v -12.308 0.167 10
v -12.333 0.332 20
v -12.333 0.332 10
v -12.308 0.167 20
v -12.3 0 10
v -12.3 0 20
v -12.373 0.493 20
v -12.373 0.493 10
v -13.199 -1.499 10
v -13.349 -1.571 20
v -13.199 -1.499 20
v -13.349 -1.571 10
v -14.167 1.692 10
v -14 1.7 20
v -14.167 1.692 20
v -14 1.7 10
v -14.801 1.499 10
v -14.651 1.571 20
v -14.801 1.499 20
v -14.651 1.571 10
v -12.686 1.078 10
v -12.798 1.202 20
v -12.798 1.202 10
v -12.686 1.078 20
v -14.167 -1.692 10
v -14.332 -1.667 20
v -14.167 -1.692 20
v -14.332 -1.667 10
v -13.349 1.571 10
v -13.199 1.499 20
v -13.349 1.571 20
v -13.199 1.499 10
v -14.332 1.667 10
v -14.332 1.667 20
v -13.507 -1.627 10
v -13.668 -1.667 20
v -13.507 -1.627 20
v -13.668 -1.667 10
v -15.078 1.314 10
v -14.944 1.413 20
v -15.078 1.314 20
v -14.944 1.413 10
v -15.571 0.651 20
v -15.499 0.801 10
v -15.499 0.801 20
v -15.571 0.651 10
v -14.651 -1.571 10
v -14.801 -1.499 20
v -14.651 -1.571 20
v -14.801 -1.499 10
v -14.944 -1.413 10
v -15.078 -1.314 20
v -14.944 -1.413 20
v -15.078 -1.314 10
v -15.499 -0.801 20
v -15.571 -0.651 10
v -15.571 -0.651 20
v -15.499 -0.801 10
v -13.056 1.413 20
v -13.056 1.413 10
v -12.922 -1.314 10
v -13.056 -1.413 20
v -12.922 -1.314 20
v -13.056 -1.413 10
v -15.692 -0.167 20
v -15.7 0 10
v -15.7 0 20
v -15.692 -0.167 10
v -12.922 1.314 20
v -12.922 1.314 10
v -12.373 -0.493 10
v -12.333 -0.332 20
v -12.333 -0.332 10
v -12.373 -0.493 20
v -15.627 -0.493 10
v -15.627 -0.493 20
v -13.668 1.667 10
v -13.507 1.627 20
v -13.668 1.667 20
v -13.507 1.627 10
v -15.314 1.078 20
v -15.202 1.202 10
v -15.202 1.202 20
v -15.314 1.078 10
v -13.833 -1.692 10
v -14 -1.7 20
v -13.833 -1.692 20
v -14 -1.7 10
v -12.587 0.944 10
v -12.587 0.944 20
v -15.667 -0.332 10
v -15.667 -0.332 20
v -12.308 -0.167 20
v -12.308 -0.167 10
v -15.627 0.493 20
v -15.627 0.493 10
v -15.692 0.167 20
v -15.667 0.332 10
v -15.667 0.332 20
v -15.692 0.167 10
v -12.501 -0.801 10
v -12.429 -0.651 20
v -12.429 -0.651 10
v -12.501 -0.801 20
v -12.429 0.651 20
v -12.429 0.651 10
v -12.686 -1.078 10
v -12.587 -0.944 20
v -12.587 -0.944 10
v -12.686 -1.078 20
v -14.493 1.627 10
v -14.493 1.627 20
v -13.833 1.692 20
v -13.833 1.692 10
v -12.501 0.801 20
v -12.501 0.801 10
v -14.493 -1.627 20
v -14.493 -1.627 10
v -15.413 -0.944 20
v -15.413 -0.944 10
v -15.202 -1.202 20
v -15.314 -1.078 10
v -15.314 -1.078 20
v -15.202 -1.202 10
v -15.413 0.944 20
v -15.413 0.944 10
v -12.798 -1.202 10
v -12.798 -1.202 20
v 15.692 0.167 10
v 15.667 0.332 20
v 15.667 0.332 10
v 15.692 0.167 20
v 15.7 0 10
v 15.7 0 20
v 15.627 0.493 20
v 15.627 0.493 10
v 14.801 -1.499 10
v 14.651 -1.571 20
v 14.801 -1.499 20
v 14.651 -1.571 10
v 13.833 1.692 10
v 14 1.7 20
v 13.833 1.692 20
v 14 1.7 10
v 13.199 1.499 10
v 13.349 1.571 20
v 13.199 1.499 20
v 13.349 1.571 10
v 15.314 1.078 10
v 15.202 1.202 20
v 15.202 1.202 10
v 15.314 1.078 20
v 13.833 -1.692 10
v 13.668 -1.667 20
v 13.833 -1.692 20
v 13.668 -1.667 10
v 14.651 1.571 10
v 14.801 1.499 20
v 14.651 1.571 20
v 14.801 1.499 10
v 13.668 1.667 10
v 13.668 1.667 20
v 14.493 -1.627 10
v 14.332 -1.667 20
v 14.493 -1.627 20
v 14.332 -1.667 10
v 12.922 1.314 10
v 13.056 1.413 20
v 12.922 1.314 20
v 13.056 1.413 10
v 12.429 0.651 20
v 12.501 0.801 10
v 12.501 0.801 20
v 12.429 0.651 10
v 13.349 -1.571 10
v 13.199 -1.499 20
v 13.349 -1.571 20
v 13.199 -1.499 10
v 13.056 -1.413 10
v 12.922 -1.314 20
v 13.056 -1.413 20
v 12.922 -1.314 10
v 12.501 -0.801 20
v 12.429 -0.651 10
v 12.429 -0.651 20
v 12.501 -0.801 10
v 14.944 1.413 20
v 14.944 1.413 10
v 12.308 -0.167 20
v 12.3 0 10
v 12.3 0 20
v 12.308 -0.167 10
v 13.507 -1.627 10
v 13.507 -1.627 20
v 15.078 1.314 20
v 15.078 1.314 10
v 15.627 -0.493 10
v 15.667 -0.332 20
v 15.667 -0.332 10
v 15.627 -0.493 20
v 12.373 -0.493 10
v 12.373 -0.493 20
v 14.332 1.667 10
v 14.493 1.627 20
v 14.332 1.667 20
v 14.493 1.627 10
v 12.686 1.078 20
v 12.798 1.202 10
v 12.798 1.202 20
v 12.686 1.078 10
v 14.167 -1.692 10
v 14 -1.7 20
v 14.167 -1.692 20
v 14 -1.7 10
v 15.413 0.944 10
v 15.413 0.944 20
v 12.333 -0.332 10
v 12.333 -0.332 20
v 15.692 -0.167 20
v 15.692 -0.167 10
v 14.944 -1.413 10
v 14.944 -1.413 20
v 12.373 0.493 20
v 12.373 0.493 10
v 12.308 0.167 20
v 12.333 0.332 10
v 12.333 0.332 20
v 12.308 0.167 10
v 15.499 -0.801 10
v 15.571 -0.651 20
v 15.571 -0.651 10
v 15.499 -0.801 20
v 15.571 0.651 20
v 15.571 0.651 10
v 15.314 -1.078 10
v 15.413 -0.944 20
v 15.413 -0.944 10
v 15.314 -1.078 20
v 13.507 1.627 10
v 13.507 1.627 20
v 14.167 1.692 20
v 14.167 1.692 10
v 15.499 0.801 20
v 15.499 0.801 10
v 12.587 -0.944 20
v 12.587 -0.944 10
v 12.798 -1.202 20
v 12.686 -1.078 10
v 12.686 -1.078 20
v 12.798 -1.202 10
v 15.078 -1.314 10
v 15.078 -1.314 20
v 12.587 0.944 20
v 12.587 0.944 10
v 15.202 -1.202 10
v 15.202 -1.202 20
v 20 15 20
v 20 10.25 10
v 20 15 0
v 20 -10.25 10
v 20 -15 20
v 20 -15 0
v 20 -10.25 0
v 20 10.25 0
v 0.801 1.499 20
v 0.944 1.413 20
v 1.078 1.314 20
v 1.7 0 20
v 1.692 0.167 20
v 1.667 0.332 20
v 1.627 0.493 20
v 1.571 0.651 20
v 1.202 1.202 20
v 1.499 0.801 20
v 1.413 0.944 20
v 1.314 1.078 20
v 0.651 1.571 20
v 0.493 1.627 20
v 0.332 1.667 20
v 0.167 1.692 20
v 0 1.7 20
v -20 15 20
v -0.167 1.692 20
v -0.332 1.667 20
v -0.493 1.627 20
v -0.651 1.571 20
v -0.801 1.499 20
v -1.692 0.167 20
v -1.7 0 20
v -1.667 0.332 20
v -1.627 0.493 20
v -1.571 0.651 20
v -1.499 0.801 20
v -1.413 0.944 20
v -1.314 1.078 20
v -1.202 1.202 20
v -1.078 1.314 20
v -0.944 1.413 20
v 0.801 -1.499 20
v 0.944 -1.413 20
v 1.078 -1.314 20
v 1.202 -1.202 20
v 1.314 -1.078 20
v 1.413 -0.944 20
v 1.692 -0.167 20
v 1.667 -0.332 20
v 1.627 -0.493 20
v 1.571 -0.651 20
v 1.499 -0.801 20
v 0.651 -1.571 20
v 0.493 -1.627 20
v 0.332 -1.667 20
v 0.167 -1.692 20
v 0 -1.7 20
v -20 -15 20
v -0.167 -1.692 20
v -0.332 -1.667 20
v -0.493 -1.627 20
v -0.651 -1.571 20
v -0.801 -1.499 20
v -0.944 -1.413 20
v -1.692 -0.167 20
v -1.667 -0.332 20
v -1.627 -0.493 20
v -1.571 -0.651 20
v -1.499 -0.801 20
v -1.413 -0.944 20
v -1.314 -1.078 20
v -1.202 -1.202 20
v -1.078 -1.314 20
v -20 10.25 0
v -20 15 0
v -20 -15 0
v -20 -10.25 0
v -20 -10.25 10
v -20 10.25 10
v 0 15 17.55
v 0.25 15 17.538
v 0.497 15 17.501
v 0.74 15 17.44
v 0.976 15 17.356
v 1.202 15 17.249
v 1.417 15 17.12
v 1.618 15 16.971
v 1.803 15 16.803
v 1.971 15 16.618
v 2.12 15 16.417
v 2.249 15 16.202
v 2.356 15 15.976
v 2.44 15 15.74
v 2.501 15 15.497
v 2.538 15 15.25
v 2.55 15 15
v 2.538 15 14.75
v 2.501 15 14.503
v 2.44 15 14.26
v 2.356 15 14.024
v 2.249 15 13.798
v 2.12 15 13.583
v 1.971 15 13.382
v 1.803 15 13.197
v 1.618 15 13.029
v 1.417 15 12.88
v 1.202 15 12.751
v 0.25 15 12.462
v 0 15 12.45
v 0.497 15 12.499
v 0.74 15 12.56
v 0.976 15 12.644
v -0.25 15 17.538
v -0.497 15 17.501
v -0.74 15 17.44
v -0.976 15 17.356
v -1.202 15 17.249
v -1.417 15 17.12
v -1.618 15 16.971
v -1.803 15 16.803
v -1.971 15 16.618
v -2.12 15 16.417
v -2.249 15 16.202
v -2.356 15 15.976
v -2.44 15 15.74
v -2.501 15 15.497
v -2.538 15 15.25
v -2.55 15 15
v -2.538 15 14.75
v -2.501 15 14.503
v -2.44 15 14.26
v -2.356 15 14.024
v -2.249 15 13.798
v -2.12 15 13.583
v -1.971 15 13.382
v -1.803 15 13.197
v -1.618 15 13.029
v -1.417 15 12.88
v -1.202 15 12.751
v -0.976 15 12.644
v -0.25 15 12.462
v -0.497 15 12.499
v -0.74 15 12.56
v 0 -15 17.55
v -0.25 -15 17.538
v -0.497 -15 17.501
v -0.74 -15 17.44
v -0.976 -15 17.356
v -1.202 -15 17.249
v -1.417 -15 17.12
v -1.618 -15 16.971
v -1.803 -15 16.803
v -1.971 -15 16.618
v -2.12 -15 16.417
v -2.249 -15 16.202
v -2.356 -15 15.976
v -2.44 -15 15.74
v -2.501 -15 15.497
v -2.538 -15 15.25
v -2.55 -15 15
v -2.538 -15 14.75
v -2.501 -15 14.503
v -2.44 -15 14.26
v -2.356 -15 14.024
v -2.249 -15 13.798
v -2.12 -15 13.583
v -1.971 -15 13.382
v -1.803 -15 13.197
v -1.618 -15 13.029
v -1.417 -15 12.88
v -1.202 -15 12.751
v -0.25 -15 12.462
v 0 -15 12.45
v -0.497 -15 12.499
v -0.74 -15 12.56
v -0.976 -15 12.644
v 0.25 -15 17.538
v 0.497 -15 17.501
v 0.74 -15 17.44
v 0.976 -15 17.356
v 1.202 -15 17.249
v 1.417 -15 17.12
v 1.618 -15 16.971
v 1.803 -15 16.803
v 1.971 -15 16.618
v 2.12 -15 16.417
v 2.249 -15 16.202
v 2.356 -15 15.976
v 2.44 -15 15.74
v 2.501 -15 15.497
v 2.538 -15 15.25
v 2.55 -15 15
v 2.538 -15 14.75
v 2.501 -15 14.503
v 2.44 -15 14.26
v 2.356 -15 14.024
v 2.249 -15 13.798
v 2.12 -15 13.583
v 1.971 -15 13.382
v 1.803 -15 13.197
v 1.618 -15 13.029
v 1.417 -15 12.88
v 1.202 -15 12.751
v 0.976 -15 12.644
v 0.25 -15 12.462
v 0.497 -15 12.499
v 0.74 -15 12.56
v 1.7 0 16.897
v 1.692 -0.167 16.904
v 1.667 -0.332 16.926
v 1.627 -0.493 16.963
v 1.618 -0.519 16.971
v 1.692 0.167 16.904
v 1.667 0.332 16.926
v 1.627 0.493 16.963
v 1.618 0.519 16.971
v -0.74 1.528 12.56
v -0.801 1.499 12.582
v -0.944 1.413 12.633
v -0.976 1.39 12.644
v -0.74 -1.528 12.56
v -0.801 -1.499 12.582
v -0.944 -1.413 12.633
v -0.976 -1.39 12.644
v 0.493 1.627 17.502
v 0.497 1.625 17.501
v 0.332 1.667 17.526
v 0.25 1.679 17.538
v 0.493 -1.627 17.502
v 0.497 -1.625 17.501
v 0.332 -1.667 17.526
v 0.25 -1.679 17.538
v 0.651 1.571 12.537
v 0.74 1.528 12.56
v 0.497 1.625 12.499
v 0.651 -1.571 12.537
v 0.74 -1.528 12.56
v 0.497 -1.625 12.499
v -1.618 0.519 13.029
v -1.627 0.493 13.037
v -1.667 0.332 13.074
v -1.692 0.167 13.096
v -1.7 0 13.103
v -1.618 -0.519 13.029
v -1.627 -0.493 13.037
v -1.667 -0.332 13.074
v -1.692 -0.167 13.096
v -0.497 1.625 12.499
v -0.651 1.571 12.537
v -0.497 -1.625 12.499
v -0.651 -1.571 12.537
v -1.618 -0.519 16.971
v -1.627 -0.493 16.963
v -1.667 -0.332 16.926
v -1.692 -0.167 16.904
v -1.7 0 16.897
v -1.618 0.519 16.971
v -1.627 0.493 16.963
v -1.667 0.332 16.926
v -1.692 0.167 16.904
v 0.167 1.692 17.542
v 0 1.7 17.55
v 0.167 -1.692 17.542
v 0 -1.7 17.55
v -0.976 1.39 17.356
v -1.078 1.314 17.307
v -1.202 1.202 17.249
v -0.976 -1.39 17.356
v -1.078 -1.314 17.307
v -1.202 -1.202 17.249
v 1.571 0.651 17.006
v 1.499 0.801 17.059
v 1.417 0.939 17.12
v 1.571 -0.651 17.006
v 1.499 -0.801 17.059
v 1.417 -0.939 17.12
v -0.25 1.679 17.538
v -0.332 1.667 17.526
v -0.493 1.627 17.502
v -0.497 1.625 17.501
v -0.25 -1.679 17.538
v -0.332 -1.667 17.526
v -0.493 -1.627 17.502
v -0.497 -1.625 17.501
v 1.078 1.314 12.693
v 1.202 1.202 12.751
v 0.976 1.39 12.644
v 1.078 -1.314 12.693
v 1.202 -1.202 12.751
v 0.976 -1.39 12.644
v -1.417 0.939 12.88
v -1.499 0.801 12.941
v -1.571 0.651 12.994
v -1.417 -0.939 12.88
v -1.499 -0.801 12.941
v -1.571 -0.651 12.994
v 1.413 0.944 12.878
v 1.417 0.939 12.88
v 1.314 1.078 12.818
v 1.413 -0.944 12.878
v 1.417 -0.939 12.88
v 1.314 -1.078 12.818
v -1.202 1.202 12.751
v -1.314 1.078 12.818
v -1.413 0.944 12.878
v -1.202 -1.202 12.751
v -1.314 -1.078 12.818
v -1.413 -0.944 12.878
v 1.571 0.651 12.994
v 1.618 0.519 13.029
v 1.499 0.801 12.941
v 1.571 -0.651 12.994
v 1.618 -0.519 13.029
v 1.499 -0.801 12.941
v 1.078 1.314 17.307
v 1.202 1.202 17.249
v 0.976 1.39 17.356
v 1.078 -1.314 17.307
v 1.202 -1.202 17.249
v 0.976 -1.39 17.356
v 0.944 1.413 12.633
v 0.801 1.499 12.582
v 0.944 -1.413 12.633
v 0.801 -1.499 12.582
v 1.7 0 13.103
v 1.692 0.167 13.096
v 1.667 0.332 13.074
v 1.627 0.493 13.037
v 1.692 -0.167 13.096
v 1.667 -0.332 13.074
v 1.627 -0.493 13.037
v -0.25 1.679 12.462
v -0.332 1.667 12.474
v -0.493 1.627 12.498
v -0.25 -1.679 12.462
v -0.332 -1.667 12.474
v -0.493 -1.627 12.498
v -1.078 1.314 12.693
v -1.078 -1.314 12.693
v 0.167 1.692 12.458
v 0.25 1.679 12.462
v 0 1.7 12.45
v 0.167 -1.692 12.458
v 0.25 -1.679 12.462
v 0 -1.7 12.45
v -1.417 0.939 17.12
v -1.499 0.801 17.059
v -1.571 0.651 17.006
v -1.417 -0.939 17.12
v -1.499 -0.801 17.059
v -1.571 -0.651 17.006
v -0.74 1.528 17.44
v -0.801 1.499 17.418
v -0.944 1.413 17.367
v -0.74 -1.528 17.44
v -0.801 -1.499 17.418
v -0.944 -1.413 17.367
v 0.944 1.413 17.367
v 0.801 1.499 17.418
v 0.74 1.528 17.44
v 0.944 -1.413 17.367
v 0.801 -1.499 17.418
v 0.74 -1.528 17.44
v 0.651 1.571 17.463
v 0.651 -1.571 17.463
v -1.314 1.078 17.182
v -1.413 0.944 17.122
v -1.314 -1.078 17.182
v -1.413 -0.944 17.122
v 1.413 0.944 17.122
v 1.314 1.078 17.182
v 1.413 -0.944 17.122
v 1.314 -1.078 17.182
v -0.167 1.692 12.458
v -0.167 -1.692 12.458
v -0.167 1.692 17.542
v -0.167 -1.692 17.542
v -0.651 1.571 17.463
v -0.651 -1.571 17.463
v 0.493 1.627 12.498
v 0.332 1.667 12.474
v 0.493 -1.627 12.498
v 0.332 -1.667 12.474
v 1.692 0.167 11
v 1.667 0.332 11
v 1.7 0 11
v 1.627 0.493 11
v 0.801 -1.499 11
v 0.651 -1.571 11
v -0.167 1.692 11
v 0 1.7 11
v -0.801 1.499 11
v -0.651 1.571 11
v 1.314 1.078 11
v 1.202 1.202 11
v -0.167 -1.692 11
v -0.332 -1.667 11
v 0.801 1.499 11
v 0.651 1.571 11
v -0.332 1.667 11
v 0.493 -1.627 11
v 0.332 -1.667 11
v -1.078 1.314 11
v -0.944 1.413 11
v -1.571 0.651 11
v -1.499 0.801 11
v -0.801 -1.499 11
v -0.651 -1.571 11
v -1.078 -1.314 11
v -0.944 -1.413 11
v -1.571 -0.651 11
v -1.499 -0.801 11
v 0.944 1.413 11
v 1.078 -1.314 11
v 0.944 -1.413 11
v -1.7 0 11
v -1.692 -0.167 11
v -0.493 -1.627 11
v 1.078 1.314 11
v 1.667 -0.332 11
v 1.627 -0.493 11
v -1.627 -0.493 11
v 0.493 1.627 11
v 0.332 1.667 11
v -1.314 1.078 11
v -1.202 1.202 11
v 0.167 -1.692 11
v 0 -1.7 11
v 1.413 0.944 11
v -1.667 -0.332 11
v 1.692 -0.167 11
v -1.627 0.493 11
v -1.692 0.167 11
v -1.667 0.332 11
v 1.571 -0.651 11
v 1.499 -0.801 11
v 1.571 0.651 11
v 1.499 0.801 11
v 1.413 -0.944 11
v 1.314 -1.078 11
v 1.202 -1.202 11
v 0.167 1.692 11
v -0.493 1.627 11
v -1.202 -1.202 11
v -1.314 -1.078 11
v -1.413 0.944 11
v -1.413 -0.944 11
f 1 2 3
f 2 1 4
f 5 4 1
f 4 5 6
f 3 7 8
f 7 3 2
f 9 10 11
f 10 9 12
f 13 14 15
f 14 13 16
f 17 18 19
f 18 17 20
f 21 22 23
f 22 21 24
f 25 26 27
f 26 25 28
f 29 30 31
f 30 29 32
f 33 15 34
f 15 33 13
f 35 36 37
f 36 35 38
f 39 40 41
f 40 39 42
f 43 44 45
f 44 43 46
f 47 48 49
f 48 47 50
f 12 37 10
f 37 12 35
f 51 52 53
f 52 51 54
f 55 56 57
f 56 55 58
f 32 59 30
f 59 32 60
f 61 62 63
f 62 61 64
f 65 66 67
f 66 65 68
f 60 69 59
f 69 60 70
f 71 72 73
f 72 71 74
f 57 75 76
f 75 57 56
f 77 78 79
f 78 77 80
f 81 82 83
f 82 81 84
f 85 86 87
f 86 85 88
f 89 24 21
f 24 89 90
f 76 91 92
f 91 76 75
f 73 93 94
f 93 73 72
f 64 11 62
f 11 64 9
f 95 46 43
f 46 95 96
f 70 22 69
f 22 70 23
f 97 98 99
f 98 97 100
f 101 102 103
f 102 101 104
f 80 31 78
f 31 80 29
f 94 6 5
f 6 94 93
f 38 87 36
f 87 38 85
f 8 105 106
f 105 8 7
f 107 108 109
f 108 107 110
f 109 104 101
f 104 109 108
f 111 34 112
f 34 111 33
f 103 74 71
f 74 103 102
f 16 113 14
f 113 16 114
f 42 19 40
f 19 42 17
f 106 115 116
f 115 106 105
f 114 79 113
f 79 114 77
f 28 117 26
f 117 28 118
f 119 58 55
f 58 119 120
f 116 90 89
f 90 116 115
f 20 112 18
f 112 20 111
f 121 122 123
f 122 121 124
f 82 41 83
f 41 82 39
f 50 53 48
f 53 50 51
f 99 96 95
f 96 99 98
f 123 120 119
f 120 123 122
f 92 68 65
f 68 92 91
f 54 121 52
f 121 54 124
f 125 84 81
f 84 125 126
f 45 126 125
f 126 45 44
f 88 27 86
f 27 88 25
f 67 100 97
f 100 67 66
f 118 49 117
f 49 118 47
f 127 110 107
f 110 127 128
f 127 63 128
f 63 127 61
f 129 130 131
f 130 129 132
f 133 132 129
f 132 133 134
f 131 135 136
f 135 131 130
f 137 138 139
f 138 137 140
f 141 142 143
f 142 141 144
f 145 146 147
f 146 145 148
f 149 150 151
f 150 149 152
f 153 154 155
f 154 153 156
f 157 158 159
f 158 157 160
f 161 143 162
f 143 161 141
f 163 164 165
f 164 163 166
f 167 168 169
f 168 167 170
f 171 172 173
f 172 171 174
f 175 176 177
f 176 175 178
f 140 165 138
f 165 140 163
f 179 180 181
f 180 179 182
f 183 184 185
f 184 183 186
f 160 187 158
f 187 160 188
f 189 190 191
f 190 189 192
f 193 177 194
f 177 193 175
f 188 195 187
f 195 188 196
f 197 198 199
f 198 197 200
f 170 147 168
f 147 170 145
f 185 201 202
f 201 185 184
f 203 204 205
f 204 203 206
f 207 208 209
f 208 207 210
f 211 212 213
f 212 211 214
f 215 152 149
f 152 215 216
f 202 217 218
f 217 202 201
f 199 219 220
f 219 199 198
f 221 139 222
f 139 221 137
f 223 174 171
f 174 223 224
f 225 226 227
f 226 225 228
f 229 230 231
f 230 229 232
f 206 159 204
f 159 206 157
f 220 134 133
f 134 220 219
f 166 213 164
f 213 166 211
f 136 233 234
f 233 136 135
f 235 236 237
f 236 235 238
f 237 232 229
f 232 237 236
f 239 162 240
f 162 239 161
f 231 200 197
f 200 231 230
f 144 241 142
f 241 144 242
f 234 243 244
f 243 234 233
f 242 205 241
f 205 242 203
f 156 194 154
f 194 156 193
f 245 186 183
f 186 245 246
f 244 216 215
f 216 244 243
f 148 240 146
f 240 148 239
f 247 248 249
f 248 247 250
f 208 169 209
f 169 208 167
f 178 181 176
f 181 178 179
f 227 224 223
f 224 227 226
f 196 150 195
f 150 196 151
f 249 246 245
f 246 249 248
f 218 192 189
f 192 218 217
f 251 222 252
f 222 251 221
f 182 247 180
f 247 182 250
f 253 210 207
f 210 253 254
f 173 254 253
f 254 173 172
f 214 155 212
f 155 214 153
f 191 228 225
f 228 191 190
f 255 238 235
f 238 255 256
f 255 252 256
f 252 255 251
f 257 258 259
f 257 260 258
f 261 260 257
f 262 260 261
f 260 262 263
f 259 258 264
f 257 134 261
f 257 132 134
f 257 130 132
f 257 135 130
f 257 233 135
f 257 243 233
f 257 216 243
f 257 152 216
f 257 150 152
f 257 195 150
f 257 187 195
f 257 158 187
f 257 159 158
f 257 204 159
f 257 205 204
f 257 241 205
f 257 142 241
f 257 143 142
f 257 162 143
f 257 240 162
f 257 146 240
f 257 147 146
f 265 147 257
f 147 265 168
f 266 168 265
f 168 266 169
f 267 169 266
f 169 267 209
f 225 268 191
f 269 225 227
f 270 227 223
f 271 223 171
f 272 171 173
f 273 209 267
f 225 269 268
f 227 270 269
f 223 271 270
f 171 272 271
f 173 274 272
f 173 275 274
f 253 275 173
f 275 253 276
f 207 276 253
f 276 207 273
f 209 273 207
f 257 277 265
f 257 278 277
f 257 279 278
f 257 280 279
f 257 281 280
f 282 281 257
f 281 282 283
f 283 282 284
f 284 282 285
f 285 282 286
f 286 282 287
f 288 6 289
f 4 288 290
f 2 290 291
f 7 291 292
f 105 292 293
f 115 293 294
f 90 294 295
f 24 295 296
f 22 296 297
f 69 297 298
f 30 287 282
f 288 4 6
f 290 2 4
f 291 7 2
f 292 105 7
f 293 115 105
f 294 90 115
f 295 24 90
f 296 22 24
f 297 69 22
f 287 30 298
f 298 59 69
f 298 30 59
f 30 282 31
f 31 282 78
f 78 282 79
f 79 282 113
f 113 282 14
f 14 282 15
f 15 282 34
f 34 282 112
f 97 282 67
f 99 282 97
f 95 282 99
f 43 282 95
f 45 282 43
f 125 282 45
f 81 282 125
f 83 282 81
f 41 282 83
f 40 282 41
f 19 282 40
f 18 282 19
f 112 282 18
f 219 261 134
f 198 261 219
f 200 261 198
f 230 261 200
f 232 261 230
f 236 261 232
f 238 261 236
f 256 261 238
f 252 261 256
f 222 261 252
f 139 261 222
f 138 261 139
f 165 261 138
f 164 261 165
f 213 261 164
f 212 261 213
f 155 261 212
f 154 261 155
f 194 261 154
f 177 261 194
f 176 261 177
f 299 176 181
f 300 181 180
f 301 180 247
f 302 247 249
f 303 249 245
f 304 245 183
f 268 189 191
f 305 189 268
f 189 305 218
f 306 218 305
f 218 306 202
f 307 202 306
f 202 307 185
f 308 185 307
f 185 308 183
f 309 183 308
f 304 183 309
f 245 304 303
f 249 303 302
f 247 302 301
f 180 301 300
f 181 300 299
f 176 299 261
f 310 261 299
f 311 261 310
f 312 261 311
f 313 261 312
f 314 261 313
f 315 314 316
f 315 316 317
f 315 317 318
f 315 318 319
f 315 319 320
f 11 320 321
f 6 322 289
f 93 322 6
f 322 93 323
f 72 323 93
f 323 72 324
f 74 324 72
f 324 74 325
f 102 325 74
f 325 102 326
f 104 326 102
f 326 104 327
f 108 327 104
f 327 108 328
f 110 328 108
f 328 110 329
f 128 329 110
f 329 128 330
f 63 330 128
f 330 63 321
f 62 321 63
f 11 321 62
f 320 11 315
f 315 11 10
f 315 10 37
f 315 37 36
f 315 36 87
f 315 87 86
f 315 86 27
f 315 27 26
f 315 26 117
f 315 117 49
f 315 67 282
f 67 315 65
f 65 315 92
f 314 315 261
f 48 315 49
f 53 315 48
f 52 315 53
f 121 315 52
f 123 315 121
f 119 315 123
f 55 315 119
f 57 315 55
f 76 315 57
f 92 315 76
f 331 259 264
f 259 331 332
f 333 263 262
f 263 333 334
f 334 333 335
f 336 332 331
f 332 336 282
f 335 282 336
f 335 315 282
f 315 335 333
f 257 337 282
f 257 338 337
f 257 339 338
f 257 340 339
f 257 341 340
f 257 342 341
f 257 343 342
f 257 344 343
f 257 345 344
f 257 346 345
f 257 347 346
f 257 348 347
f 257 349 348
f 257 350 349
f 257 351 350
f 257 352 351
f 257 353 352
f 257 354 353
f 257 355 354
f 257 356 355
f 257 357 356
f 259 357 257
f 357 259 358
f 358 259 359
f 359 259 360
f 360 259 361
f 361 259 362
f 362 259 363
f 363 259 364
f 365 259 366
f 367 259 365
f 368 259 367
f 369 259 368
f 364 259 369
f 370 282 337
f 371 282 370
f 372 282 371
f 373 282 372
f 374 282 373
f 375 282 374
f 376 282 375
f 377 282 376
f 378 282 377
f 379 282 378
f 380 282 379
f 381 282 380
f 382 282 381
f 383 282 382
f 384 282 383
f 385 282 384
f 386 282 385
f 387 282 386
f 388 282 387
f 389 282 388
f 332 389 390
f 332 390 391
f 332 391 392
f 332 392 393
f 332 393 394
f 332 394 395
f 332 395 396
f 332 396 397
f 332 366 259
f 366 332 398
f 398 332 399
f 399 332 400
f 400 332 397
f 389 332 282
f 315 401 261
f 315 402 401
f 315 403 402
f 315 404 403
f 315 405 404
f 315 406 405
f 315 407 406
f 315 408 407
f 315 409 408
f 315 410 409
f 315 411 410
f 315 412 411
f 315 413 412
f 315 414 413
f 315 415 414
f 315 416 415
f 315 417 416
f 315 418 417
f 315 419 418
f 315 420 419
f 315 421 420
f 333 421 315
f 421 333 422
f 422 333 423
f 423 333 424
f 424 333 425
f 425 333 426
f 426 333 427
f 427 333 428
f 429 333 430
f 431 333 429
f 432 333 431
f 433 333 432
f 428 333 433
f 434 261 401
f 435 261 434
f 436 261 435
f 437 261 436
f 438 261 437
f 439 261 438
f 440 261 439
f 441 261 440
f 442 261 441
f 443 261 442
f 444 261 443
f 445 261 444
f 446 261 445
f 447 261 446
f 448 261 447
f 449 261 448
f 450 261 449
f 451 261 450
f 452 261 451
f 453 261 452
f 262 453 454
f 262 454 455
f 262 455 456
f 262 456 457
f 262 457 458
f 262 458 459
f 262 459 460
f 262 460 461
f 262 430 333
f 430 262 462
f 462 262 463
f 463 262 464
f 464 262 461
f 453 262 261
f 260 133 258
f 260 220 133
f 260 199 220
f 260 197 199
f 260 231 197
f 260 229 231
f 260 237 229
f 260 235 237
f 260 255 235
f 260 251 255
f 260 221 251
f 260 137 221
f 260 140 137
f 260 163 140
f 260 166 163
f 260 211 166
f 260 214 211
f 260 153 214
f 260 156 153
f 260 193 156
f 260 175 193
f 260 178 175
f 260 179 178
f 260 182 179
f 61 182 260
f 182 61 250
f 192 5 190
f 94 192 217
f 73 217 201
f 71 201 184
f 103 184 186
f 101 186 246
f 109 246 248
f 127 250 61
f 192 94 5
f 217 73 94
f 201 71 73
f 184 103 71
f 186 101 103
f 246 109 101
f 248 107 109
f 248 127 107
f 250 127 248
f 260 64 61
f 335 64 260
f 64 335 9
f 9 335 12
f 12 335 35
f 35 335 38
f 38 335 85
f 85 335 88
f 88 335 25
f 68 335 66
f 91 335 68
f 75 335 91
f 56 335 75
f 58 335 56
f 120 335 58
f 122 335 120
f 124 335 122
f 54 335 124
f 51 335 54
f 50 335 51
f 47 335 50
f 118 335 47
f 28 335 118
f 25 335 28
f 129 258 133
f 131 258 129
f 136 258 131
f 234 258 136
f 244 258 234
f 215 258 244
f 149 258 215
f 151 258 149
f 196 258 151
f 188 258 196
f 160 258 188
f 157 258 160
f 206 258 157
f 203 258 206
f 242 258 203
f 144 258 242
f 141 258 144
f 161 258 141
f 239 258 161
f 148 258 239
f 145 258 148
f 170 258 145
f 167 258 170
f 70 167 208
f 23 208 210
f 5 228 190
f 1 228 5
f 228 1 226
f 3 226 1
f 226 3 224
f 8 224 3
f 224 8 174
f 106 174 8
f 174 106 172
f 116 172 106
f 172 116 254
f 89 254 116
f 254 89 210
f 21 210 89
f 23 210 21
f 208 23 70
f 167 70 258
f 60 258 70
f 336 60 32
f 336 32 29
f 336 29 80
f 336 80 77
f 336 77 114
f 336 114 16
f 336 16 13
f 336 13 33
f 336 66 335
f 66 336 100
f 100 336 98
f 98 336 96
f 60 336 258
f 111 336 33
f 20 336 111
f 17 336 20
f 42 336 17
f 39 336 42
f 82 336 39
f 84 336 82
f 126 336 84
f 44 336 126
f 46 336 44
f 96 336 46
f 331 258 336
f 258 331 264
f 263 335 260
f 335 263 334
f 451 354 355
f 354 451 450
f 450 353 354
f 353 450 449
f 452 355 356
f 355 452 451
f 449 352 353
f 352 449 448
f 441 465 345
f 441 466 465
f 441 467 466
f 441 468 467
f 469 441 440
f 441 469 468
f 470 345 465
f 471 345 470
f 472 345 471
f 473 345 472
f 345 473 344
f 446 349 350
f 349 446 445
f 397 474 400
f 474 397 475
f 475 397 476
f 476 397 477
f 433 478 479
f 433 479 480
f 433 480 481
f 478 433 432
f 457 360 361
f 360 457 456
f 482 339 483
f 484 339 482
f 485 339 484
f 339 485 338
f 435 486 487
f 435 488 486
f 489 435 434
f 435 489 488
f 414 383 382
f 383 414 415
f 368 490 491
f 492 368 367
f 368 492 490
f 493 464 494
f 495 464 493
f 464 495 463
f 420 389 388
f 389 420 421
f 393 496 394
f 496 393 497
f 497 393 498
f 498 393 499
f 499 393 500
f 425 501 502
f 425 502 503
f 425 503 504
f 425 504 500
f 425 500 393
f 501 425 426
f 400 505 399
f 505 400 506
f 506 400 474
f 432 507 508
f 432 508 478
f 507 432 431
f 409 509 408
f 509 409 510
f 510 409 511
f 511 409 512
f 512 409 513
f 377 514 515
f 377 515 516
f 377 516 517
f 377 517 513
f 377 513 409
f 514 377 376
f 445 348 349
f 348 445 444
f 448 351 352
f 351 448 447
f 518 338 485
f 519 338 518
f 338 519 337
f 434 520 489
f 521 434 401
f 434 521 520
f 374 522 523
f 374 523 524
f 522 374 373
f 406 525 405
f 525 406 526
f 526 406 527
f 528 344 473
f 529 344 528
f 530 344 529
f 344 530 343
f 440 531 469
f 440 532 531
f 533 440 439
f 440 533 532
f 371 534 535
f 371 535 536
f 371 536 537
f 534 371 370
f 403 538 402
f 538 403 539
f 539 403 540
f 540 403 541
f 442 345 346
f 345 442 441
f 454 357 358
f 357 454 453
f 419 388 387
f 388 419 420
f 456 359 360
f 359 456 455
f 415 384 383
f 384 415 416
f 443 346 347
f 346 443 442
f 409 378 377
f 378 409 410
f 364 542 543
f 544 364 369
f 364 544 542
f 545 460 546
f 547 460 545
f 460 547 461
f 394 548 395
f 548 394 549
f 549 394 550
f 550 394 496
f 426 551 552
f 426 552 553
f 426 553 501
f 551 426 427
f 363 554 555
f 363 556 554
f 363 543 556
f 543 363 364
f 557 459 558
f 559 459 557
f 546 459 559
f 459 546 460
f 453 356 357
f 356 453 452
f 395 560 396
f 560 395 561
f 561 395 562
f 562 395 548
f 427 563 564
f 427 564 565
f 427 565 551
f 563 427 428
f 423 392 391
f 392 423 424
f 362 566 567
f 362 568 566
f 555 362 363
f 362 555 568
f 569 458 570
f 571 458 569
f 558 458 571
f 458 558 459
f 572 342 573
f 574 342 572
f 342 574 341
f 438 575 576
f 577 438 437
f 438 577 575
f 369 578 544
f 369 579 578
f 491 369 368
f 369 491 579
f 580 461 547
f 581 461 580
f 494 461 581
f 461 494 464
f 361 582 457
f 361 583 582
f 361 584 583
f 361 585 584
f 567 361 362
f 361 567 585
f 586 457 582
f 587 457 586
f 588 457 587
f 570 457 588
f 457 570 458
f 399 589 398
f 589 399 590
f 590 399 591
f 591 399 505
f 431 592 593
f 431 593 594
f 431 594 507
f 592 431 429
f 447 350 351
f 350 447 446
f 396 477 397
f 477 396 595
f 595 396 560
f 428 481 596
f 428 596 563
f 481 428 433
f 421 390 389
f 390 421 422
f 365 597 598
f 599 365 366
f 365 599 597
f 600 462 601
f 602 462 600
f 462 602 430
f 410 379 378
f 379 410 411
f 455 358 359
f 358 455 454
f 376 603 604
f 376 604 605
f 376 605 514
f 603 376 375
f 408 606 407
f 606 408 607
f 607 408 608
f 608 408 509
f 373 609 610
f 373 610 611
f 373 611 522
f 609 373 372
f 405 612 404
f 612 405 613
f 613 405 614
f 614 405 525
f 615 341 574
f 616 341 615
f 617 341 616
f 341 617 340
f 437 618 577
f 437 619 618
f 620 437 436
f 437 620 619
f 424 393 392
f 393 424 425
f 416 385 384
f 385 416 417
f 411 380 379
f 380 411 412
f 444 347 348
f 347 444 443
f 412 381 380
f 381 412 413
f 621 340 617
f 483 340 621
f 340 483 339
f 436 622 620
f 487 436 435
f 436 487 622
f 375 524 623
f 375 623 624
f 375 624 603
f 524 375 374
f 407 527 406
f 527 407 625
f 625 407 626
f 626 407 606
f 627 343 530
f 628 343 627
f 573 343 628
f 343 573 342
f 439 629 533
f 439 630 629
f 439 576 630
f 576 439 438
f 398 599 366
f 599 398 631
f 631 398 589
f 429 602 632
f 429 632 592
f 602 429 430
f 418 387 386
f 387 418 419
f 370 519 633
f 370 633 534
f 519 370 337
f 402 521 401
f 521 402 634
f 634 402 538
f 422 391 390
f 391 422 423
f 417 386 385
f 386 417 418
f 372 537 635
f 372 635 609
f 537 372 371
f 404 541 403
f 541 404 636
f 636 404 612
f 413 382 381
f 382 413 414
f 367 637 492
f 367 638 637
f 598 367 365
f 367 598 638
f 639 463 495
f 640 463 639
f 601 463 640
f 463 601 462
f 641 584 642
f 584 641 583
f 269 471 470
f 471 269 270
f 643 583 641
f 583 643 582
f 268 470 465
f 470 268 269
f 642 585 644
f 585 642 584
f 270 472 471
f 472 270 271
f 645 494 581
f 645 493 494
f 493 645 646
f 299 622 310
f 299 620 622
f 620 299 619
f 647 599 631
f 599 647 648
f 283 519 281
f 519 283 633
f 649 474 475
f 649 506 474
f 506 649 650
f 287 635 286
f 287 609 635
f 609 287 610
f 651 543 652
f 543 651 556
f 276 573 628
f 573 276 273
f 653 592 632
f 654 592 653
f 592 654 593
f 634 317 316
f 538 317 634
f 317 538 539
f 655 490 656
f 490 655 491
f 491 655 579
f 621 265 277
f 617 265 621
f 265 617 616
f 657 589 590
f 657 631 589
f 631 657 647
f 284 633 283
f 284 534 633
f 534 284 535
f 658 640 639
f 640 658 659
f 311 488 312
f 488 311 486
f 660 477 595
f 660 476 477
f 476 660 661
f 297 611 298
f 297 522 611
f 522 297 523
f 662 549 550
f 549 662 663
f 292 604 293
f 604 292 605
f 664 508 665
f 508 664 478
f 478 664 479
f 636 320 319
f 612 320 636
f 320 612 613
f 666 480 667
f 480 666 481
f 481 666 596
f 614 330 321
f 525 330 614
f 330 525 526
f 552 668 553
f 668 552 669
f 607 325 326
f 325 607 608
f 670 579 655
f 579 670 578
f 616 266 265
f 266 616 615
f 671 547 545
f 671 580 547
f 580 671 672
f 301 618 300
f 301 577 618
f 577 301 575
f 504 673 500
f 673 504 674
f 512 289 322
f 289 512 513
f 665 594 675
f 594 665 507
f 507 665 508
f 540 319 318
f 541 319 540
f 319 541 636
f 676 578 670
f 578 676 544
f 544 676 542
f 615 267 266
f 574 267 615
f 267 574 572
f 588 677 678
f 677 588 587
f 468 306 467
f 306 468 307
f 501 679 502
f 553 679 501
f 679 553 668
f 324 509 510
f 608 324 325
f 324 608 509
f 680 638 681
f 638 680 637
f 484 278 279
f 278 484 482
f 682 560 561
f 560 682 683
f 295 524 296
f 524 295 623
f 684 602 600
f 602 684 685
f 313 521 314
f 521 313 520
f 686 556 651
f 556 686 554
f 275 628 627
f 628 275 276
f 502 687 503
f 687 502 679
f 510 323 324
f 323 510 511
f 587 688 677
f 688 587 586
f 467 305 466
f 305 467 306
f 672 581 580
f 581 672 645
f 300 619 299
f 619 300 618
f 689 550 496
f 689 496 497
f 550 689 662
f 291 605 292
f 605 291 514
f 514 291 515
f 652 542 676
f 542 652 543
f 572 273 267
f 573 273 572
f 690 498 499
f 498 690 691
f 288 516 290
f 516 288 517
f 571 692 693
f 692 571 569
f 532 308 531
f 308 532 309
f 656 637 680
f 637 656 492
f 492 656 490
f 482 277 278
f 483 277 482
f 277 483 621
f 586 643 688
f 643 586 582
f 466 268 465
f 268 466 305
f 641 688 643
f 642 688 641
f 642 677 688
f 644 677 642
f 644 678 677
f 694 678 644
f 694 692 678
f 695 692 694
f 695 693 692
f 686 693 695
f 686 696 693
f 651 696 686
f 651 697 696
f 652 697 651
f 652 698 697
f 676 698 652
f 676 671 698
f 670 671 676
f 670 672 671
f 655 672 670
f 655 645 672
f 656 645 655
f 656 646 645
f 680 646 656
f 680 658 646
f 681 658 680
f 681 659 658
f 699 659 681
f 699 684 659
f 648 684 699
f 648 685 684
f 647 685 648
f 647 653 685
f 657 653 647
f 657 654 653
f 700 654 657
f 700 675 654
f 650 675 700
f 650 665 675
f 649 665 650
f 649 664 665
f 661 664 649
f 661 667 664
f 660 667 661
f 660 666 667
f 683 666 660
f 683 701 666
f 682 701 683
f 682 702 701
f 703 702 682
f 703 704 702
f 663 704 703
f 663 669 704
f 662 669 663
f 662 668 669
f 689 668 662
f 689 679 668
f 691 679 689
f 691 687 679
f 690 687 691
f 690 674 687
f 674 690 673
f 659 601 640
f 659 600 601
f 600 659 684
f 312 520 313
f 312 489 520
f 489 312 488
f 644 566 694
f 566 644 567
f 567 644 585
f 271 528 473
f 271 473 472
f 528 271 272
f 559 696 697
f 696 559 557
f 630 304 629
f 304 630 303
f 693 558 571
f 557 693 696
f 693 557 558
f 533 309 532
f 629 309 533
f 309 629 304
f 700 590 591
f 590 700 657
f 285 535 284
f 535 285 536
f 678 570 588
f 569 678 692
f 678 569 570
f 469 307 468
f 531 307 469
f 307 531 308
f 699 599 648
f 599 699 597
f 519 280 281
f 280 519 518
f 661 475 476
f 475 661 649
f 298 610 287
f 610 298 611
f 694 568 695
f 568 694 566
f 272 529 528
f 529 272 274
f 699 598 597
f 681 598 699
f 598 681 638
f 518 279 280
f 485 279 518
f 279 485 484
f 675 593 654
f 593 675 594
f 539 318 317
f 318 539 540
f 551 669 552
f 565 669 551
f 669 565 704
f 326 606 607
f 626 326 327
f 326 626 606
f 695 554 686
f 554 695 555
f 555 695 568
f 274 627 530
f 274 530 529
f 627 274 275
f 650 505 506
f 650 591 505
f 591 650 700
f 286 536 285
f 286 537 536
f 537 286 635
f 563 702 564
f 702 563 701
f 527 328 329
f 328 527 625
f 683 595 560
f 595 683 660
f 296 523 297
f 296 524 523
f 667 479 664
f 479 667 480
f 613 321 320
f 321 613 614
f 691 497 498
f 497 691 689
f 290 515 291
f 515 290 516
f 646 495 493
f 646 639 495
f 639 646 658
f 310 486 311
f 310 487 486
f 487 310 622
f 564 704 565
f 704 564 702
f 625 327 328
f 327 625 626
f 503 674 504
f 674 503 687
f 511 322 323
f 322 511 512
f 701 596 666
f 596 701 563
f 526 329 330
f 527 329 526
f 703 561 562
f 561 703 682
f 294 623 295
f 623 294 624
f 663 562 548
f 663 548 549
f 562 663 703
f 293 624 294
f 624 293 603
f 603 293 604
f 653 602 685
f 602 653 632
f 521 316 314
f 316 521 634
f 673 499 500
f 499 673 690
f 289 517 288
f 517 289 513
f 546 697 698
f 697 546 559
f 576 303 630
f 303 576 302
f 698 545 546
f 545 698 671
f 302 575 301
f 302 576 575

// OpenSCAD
// Yagi / J-pole element holder: clamps to a boom and holds an element rod at 90 deg. CC0.
// boom: square or round boom size; element: rod/tube diameter (e.g. 3.2 brazing rod, 6.35 tube).
boom = 20; round_boom = false; element = 4.8; len = 40; screw = 3.4;
$fn = 64;
h = boom + 10;
difference() {
  translate([-len / 2, -h / 2, 0]) cube([len, h, boom / 2 + 10]);
  if (round_boom) translate([-len / 2 - 1, 0, 0]) rotate([0, 90, 0]) cylinder(d = boom + 0.5, h = len + 2);
  else translate([-len / 2 - 1, -(boom + 0.5) / 2, -1]) cube([len + 2, boom + 0.5, boom / 2 + 1]);
  translate([0, -h, boom / 2 + 5]) rotate([-90, 0, 0]) cylinder(d = element + 0.3, h = 2 * h);
  for (x = [-len / 2 + 6, len / 2 - 6]) translate([x, 0, -1]) cylinder(d = screw, h = boom + 20);
  translate([0, 0, boom / 2 + 1]) cylinder(d = screw, h = 20);
}
